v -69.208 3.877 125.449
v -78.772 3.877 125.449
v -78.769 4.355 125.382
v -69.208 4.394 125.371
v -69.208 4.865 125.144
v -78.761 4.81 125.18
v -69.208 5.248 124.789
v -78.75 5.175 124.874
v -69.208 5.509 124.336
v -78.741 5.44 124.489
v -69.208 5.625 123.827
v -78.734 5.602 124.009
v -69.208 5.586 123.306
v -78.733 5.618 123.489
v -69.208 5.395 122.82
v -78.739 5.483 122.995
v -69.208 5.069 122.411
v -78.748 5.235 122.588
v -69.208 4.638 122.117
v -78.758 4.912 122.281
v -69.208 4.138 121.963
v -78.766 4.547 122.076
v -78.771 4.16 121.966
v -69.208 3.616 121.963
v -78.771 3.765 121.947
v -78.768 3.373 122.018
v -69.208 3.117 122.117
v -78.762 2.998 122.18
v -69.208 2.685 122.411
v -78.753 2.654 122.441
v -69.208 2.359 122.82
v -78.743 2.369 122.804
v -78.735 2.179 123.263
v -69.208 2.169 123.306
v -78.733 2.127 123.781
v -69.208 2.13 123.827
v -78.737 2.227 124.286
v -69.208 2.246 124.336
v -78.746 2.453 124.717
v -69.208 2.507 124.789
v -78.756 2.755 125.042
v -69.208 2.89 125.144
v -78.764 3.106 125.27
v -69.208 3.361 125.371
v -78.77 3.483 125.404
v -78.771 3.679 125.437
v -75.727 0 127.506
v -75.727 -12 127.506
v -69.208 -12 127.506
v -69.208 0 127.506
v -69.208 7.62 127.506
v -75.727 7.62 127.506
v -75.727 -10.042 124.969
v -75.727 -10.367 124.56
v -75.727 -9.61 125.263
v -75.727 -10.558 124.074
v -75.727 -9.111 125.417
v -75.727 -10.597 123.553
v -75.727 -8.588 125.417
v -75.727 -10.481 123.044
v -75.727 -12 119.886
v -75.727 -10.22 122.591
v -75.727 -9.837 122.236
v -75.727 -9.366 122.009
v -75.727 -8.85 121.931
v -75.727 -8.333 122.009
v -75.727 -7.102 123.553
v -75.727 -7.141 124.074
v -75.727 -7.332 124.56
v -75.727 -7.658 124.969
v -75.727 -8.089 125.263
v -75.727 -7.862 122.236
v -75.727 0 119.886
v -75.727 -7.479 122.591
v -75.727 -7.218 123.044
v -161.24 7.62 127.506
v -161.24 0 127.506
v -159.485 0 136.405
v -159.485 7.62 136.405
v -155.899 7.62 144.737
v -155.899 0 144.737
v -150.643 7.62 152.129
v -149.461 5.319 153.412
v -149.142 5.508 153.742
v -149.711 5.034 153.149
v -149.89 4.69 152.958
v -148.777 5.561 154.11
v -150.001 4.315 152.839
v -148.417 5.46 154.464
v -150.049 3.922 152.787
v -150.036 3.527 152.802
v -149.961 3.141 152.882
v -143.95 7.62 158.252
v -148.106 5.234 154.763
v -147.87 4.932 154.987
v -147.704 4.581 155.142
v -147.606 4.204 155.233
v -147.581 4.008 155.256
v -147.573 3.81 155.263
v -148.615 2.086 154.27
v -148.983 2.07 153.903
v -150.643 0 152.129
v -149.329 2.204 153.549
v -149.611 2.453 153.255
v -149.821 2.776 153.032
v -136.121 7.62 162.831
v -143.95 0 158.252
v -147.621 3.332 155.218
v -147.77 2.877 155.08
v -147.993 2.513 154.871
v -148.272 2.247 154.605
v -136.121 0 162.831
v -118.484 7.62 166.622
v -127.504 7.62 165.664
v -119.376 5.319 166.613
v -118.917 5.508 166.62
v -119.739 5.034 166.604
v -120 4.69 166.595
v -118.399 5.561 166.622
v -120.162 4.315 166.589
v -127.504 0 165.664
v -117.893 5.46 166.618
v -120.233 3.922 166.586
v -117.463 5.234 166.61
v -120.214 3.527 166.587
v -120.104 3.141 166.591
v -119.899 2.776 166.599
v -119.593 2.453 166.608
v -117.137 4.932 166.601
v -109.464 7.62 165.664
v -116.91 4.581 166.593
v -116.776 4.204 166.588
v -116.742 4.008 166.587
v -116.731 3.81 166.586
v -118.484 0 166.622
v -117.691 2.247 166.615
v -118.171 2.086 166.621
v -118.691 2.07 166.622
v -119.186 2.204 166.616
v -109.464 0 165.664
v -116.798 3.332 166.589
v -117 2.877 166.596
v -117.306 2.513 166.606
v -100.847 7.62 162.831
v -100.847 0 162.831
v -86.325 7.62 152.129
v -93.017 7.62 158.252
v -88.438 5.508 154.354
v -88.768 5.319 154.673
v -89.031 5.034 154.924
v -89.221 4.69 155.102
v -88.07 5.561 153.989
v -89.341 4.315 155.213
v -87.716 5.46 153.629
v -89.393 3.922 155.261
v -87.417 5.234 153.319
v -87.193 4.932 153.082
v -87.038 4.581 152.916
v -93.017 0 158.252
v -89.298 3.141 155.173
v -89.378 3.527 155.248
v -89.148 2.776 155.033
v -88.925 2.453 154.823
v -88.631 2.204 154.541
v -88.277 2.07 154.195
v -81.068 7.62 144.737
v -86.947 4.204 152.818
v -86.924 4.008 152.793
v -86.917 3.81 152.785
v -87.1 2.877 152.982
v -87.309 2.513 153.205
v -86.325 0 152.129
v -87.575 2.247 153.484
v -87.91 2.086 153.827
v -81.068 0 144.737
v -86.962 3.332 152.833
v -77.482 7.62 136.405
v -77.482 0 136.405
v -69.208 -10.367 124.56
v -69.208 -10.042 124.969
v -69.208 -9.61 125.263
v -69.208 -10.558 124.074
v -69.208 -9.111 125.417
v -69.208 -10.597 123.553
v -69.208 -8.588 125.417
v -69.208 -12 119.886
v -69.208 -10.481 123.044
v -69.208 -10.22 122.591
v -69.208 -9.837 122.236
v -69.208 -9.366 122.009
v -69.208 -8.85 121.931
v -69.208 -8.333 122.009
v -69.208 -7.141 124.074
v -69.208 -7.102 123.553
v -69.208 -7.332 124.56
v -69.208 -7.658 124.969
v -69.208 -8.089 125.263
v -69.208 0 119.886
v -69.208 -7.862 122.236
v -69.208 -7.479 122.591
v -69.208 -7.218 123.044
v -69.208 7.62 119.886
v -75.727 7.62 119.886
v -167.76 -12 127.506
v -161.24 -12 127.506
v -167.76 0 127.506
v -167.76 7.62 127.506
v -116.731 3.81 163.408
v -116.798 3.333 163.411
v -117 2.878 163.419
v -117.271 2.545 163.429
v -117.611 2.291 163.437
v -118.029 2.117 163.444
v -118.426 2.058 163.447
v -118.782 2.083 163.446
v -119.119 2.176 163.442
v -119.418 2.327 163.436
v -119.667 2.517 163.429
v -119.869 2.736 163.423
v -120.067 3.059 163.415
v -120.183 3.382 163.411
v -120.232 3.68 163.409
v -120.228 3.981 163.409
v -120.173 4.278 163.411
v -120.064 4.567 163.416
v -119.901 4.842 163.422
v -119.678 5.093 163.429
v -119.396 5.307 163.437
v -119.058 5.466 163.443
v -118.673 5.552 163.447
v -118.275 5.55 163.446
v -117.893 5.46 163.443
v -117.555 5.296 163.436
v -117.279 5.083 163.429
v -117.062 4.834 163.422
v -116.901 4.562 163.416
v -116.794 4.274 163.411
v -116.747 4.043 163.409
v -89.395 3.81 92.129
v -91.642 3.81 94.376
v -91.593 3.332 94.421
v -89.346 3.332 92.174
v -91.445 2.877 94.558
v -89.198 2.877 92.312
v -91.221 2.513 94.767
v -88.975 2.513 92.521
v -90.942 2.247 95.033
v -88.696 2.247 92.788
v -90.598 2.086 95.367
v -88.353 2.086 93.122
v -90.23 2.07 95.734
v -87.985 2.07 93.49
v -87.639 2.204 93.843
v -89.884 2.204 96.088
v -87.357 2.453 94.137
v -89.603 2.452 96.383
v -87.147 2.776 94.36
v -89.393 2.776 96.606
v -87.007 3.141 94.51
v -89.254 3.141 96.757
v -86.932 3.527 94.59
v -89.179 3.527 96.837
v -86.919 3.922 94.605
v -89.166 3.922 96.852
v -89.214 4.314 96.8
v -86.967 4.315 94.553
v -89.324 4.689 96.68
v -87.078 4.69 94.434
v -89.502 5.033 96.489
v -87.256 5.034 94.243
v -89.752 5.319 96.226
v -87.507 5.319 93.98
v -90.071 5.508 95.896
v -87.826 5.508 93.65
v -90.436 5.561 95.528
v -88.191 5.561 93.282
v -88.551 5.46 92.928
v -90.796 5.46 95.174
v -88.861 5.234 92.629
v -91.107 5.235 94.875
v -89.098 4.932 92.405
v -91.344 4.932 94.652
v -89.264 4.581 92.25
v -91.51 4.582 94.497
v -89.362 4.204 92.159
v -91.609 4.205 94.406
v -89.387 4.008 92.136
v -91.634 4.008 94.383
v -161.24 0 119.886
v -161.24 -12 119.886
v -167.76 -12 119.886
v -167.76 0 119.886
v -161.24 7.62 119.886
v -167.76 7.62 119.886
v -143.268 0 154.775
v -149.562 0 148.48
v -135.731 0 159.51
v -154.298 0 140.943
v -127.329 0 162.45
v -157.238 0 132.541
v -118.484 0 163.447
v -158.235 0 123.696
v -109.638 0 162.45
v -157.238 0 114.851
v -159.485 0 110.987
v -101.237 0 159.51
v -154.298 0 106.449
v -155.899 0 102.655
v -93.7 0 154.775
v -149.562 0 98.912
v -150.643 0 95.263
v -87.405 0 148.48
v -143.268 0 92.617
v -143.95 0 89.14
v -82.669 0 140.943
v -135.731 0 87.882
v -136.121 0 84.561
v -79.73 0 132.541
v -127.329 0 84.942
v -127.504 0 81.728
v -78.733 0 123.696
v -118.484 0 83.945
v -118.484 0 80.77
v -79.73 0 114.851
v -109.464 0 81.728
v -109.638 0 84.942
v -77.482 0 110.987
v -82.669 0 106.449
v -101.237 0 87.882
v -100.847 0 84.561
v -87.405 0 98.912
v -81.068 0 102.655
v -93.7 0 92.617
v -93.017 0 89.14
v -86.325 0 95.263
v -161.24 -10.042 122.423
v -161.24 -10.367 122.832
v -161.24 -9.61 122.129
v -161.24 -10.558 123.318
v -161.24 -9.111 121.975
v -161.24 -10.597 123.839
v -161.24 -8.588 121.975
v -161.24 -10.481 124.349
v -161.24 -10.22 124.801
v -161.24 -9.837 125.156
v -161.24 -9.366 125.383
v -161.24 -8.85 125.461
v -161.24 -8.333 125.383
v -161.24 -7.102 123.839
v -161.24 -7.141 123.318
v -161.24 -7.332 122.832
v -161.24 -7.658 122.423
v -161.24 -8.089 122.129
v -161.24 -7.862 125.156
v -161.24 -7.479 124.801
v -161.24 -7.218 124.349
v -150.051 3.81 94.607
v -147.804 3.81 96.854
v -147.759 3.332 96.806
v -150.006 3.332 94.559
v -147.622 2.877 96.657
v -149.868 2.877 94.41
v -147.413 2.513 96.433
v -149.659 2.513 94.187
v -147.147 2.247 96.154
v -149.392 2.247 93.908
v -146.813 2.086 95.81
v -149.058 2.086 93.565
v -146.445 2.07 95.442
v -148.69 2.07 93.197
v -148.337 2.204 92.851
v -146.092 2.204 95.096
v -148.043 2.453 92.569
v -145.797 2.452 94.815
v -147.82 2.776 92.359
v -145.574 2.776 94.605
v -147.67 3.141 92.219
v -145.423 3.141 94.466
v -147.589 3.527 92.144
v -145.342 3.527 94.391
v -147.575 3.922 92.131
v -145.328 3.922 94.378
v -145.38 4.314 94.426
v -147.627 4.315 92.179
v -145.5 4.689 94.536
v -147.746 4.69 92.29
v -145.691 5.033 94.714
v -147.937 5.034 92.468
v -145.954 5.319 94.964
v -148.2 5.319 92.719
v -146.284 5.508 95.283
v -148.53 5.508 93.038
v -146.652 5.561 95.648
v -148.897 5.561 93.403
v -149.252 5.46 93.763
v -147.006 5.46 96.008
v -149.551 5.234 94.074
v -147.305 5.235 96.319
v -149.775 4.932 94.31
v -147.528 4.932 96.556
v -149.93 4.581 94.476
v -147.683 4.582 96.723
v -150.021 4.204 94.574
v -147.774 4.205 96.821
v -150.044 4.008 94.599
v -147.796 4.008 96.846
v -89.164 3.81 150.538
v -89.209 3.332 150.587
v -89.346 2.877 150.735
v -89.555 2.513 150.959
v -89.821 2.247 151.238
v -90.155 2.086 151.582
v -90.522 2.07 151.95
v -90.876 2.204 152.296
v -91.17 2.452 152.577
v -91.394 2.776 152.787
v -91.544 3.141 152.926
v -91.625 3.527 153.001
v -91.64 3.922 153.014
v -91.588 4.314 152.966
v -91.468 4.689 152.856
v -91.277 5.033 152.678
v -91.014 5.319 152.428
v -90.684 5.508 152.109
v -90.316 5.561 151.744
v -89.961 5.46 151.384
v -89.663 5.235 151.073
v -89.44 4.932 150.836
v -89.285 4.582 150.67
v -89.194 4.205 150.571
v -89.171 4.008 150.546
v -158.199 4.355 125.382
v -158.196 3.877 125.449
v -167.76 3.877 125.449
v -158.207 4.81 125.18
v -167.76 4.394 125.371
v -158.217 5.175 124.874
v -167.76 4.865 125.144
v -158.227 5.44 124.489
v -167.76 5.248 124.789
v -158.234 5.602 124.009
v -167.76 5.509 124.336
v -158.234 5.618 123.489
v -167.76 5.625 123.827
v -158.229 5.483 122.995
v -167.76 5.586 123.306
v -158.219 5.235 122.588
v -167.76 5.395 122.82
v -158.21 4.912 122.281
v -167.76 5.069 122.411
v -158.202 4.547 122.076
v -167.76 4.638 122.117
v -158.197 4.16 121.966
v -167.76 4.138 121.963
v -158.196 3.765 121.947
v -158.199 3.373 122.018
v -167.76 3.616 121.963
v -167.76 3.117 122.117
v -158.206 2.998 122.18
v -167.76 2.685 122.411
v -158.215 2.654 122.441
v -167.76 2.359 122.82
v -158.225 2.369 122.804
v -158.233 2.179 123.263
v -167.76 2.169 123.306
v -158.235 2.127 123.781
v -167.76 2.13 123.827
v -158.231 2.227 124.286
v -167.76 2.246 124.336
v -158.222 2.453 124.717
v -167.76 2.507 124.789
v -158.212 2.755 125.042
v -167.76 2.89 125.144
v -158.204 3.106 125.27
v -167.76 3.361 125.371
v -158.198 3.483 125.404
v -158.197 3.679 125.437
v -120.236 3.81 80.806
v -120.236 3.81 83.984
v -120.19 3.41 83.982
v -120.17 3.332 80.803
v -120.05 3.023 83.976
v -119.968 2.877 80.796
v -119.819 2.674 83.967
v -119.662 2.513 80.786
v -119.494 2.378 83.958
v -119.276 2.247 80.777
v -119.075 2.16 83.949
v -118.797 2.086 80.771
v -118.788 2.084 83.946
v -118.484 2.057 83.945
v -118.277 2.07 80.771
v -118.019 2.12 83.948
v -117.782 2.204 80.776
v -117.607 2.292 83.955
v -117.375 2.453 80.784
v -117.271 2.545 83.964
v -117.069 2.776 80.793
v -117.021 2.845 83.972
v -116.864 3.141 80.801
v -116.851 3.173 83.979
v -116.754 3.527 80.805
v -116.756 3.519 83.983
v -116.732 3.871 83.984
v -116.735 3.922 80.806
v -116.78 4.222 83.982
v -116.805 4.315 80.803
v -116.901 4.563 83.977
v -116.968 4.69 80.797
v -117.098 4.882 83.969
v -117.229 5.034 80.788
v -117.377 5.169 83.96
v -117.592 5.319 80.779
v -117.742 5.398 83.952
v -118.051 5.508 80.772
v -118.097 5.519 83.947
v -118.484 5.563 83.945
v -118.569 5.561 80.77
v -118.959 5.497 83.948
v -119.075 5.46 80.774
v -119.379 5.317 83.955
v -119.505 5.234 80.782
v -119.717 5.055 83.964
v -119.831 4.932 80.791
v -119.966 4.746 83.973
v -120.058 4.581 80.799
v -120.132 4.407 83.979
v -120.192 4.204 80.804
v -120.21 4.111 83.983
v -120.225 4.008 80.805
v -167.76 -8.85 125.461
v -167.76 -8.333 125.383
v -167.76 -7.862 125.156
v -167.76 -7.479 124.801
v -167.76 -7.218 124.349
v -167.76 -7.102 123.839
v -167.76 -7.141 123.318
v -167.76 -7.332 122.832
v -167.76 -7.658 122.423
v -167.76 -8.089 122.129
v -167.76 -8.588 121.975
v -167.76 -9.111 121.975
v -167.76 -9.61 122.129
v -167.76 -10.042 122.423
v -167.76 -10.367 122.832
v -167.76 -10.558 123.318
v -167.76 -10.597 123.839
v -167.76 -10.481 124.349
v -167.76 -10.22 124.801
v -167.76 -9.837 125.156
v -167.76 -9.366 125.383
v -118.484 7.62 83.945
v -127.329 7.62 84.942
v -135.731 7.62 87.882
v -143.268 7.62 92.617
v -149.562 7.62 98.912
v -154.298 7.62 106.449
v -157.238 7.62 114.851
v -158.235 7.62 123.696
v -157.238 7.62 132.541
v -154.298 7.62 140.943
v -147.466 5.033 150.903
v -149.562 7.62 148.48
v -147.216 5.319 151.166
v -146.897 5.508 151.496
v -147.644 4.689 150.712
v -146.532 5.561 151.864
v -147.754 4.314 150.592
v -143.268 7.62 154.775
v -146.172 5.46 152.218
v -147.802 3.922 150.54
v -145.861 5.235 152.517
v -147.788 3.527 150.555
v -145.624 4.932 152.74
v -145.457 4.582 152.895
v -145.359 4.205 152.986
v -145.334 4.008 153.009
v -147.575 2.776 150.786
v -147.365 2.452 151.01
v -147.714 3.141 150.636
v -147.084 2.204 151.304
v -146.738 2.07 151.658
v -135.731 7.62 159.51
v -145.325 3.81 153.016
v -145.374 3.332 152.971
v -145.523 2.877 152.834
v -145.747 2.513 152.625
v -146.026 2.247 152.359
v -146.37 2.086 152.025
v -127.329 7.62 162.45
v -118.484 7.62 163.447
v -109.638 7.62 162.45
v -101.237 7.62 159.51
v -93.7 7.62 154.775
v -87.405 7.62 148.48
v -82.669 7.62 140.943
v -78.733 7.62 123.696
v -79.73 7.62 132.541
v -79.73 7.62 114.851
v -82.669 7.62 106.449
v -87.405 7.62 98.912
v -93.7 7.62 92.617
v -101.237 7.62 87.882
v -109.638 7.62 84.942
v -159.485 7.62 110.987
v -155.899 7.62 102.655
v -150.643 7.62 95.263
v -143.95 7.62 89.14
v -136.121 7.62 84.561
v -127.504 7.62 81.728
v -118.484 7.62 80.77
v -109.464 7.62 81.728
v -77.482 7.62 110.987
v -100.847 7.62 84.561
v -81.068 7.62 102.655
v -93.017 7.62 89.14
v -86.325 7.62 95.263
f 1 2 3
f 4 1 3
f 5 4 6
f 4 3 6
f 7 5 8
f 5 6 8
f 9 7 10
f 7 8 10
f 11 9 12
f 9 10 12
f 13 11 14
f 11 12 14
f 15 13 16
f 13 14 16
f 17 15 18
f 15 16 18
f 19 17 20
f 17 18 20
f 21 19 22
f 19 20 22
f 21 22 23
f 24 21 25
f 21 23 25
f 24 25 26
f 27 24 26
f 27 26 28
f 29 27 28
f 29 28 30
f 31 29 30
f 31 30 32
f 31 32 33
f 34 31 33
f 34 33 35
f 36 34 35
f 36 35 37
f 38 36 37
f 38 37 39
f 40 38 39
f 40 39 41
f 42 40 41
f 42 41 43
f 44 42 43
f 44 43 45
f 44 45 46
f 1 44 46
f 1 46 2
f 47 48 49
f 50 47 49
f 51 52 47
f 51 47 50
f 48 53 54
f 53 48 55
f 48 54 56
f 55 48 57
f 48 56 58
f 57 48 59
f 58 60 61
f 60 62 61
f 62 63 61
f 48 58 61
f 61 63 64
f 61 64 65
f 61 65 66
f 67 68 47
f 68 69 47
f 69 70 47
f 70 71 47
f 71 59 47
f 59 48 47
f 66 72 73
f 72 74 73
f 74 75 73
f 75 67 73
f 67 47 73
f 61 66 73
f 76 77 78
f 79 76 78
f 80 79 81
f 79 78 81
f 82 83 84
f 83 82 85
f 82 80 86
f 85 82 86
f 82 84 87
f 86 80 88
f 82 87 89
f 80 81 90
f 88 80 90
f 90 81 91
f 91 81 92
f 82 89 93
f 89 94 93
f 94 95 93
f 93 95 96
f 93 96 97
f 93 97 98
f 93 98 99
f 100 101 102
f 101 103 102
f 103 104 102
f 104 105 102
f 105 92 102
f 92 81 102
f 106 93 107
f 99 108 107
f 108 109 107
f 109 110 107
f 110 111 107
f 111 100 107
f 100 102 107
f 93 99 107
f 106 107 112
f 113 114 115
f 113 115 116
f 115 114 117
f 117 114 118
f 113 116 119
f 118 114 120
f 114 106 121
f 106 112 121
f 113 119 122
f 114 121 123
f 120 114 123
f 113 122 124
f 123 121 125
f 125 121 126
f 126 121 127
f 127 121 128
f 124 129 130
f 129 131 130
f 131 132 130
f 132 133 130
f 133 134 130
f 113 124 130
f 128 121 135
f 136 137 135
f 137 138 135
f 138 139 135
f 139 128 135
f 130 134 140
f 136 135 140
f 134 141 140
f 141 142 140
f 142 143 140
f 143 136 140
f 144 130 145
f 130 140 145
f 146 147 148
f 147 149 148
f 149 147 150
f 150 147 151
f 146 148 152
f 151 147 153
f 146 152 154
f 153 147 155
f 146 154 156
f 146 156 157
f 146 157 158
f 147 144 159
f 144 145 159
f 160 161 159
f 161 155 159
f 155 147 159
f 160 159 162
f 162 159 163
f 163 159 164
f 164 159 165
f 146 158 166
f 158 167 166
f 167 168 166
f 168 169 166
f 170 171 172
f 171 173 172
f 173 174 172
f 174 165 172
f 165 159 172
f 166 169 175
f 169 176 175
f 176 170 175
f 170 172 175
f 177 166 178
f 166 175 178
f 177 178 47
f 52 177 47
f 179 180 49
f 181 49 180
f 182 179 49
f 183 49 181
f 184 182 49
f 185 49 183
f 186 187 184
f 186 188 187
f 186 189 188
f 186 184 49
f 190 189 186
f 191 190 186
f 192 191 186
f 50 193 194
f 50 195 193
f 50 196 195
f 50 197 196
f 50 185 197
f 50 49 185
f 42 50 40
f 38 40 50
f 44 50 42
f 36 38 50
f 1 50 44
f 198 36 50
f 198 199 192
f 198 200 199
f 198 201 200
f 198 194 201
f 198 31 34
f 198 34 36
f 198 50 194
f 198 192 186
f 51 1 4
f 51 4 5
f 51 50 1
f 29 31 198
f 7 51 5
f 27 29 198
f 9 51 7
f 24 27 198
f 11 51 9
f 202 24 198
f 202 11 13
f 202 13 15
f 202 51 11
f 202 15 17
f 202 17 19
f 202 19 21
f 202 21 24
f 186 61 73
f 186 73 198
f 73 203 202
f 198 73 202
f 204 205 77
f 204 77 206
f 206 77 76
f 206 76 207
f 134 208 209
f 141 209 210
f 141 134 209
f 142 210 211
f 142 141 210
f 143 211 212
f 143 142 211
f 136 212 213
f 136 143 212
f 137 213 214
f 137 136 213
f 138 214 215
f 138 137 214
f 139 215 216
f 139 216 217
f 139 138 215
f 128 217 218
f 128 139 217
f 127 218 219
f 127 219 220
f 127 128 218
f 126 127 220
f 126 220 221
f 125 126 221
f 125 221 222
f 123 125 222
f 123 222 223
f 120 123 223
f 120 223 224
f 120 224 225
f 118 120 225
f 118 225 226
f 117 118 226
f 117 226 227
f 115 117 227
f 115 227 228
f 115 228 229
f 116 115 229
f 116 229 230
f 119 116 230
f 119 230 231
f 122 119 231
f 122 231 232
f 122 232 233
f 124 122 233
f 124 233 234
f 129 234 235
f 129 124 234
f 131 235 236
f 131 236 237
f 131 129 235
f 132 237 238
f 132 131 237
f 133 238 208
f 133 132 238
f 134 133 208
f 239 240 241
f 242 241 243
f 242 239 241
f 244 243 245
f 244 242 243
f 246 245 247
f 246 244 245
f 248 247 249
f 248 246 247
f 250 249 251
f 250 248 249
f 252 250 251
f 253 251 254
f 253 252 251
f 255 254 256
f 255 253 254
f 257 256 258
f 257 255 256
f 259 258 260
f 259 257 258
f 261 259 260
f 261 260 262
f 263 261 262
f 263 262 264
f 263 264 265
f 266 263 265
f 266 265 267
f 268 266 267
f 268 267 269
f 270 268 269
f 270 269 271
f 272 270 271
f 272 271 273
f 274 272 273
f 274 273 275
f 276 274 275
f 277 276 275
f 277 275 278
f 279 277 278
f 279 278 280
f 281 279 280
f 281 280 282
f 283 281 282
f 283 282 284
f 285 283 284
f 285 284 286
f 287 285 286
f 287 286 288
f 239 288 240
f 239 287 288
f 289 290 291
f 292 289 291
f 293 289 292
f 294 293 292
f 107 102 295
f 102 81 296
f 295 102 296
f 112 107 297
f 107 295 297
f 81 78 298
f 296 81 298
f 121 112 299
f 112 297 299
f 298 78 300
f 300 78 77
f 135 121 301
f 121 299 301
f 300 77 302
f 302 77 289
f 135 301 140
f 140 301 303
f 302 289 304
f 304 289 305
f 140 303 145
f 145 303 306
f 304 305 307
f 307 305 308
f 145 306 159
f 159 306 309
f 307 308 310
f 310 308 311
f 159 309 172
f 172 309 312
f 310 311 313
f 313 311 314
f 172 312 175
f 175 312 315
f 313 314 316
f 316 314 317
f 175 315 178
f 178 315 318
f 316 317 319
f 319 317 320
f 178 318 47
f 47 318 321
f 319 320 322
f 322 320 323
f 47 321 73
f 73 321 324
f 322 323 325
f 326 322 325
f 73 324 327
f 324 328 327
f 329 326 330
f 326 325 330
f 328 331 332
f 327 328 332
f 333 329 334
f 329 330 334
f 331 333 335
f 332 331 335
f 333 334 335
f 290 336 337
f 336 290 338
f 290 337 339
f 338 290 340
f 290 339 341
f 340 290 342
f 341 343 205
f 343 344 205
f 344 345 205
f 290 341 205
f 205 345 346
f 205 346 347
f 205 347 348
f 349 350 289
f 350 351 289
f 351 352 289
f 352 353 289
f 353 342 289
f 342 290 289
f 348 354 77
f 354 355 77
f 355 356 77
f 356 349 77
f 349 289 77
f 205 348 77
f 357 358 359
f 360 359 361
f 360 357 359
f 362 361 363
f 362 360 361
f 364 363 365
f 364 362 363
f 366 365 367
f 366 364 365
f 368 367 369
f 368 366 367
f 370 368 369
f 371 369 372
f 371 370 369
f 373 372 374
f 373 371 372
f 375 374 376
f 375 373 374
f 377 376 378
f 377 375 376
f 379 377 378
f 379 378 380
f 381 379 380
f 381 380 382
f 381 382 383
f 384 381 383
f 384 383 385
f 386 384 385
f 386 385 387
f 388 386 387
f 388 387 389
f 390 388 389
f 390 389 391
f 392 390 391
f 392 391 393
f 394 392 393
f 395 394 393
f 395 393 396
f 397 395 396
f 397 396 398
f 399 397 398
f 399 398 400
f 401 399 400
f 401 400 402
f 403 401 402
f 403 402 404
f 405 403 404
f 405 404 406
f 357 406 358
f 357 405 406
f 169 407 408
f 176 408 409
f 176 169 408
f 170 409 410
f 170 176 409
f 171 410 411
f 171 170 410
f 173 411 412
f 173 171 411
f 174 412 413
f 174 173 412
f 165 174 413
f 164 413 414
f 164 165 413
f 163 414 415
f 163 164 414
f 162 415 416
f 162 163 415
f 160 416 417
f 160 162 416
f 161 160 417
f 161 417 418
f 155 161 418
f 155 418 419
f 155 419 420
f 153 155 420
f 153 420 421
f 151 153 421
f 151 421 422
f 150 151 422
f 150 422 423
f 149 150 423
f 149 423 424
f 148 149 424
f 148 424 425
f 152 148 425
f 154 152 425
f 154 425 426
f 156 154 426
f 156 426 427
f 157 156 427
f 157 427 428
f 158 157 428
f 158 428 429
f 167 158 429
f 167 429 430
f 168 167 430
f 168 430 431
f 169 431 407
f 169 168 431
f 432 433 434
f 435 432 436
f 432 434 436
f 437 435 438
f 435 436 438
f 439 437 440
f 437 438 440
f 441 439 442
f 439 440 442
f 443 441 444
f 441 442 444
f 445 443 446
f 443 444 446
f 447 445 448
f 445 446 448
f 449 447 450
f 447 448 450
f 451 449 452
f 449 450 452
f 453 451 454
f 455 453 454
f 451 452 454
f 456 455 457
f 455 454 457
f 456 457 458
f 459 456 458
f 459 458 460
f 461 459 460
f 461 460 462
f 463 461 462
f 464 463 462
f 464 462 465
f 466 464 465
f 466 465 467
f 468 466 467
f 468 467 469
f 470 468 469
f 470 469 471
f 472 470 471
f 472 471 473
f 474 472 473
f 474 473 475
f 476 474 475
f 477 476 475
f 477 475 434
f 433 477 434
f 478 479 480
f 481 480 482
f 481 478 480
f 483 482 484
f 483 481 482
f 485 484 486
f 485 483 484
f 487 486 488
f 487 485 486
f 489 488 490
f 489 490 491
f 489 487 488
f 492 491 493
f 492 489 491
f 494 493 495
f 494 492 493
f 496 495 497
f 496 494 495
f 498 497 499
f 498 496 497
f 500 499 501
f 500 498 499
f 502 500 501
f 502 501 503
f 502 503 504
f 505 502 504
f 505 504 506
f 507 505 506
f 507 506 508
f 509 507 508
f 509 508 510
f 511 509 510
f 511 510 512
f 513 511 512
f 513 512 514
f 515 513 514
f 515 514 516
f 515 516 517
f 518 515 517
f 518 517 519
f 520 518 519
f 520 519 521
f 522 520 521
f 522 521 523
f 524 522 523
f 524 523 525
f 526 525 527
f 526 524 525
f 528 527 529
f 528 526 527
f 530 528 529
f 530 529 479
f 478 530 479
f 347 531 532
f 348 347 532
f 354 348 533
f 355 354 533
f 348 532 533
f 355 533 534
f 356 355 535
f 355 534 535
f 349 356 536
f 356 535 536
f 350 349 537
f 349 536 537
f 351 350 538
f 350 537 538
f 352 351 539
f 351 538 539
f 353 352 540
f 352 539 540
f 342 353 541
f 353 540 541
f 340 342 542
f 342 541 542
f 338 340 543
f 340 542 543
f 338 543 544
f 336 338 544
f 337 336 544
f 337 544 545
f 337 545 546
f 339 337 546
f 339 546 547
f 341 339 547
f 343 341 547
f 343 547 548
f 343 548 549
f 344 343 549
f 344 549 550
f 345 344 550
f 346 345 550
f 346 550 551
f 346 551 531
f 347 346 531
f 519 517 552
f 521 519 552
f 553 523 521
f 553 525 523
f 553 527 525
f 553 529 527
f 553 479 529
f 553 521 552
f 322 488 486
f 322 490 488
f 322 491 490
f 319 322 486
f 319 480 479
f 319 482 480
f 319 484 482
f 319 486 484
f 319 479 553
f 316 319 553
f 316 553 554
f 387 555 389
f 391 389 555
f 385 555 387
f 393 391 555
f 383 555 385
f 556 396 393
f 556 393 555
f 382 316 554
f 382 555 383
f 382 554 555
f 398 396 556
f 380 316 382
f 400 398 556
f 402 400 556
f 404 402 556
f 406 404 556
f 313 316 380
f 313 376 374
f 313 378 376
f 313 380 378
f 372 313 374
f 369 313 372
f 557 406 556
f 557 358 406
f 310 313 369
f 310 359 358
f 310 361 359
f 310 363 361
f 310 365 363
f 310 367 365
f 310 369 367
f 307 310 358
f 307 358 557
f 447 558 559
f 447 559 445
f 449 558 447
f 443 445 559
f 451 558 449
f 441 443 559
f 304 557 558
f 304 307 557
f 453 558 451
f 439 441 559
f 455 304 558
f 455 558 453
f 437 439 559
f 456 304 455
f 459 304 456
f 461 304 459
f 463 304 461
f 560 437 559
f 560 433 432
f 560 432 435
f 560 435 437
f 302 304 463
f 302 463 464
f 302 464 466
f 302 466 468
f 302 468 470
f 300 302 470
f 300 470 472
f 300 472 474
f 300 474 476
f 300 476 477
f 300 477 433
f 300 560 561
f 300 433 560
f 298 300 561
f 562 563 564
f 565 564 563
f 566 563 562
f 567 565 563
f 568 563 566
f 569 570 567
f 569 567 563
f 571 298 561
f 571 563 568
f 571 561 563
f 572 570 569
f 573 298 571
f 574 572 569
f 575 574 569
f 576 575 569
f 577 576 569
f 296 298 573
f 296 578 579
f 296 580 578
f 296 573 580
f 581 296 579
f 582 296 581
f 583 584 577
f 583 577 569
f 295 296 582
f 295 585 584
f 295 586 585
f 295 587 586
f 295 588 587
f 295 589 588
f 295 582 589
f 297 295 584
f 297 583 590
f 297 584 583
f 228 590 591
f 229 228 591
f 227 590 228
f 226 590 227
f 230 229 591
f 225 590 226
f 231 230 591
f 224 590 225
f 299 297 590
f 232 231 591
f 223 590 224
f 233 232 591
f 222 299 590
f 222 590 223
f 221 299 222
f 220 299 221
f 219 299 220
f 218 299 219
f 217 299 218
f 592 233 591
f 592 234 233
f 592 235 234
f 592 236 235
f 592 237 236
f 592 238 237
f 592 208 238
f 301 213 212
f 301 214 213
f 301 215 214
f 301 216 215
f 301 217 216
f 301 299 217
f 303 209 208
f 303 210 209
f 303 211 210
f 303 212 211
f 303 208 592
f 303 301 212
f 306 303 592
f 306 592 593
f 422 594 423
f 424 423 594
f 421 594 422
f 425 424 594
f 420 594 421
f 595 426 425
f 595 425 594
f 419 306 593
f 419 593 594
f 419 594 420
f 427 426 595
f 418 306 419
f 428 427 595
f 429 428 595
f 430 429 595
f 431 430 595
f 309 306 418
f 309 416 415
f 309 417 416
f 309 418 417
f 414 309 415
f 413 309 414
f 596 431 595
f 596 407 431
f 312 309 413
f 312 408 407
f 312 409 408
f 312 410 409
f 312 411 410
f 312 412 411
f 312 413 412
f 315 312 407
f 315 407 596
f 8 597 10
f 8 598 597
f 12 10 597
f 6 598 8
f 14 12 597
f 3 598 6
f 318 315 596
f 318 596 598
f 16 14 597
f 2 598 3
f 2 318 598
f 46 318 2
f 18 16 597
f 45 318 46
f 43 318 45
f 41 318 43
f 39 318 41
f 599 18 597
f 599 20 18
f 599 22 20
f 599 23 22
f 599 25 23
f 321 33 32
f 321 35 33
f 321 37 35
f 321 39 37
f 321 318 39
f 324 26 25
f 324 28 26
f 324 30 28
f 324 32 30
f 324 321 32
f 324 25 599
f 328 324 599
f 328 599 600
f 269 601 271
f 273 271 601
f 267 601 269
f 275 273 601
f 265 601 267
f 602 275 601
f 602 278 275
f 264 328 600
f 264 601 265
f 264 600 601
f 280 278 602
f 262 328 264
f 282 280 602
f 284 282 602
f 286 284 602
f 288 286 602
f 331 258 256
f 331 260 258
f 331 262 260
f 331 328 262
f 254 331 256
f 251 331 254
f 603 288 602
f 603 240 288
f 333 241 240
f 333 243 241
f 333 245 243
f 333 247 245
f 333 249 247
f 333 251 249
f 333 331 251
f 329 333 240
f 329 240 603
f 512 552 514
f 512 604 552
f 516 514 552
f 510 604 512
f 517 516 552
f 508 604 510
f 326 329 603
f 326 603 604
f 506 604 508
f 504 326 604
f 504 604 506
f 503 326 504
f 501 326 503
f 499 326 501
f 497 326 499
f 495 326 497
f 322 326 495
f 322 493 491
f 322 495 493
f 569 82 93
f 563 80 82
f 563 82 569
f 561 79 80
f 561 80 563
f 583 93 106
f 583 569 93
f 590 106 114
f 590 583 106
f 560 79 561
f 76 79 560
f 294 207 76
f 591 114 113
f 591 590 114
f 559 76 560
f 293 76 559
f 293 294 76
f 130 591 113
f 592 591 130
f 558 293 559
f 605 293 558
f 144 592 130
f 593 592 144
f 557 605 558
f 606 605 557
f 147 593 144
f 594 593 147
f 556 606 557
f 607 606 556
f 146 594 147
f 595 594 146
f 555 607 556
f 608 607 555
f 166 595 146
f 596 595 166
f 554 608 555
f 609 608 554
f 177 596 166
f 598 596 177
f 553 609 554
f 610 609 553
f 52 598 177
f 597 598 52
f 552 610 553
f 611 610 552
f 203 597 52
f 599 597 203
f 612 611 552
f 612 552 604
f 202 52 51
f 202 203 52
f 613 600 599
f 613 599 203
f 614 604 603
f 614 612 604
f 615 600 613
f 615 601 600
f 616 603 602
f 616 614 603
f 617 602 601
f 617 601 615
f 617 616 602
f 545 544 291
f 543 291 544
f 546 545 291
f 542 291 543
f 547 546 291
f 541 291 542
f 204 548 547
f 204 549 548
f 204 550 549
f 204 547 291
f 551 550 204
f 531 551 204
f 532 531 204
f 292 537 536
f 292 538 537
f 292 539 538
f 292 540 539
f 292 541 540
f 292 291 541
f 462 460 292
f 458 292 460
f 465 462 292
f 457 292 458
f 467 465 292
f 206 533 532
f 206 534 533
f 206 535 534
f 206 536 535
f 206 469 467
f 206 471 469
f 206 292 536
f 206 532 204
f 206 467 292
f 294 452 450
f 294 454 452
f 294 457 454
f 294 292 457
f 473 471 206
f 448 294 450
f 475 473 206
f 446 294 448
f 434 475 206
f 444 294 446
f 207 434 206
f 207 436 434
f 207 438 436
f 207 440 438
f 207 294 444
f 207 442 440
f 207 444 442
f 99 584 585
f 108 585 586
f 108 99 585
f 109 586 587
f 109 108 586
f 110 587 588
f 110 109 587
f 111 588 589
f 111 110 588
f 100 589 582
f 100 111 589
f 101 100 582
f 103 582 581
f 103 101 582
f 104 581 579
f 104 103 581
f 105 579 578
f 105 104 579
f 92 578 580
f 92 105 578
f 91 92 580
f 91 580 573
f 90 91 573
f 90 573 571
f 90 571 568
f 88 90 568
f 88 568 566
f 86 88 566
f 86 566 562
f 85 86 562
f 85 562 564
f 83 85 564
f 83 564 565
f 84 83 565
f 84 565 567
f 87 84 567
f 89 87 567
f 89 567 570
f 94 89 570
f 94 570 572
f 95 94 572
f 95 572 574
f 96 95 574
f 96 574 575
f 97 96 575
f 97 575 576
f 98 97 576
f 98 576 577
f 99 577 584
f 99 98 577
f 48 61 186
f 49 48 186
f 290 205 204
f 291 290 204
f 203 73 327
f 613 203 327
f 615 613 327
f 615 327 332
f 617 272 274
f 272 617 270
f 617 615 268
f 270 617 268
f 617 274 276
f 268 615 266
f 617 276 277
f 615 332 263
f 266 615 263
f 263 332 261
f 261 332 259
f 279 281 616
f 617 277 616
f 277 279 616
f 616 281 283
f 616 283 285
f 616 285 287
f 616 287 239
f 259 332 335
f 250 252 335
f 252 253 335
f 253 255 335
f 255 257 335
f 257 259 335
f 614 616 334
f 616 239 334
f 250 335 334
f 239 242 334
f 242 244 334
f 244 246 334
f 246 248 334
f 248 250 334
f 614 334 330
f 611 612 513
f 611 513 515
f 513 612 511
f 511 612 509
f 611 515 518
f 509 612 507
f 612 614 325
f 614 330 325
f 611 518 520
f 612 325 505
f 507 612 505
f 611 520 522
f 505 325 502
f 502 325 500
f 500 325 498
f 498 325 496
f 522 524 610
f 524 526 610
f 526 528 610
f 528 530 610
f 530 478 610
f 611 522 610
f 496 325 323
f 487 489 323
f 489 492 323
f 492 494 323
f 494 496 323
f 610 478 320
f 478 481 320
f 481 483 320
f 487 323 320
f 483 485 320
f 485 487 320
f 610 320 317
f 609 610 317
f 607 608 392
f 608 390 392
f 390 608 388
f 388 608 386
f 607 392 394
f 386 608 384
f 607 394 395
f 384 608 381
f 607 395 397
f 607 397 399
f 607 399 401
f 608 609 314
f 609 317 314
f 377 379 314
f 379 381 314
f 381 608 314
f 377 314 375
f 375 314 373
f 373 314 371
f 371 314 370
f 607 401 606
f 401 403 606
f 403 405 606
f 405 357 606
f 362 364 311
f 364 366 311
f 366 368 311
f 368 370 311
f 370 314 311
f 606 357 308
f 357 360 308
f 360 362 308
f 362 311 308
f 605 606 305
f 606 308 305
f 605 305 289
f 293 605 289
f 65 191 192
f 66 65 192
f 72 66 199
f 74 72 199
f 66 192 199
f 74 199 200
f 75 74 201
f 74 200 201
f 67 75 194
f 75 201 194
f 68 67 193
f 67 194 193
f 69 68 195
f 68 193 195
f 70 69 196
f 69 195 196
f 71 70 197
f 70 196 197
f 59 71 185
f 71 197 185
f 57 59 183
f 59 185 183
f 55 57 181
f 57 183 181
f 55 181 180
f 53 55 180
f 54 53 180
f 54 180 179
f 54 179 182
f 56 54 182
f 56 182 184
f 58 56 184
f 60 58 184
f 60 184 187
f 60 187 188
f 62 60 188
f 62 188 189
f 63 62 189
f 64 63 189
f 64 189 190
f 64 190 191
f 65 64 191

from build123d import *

# Parameters (mm, degrees)
SKETCH1_R           = 42.926
SKETCH1_R_2         = 39.751
BOSS_EXTRUDE1_DEPTH = 7.62
SKETCH2_R           = 1.7526
CUT_EXTRUDE1_DEPTH  = 95.7
CIRPATTERN1_COUNT   = 8
SKETCH6_R           = 1.7526
CUT_EXTRUDE2_DEPTH  = 119.35
BOSS_EXTRUDE2_START = -7.62
SKETCH8_W           = 6.519417161
SKETCH8_H           = 7.62
BOSS_EXTRUDE2_DEPTH = 12
SKETCH10_R          = 1.7526
CUT_EXTRUDE3_DEPTH  = 9
CIRPATTERN2_COUNT   = 2


with BuildPart() as part:
    # Sketch1 → Boss-Extrude1 (new body)
    # profile 1 of 3: a face of its own
    with BuildSketch(Plane(origin=(0, 0, 0), x_dir=(1, 0, 0), z_dir=(0, 1, 0))):
        with BuildLine():
            Line((-167.759899912, -119.886046801), (-167.759899912, -127.506046801))
            Line((-167.759899912, -127.506046801), (-161.24048275, -127.506046801))
            ThreePointArc((-161.24048275, -127.506046801), (-161.409899912, -123.696046801), (-161.24048275, -119.886046801))
            Line((-161.24048275, -119.886046801), (-167.759899912, -119.886046801))
        make_face()
    # profile 2 of 3: a face of its own
    with BuildSketch(Plane(origin=(0, 0, 0), x_dir=(1, 0, 0), z_dir=(0, 1, 0))):
        with Locations((-118.483899912, -123.696046801)):
            Circle(SKETCH1_R)
        with Locations(Location((-118.483899912, -123.696046801, 0), (0, 0, 90))):
            Circle(SKETCH1_R_2, mode=Mode.SUBTRACT)
    # profile 3 of 3: a face of its own
    with BuildSketch(Plane(origin=(0, 0, 0), x_dir=(1, 0, 0), z_dir=(0, 1, 0))):
        with BuildLine():
            ThreePointArc((-75.557899912, -123.696046801), (-75.600275118, -125.602929216), (-75.727317073, -127.506046801))
            Line((-75.727317073, -127.506046801), (-69.207899912, -127.506046801))
            Line((-69.207899912, -127.506046801), (-69.207899912, -119.886046801))
            Line((-69.207899912, -119.886046801), (-75.727317073, -119.886046801))
            ThreePointArc((-75.727317073, -119.886046801), (-75.600275118, -121.789164387), (-75.557899912, -123.696046801))
        make_face()
    extrude(amount=BOSS_EXTRUDE1_DEPTH)

    # Sketch2 → Cut-Extrude1 (cut)
    with BuildSketch(Plane.XY):
        with Locations(Location((-118.483899912, 3.81, 0), (0, 0, 180))):
            Circle(SKETCH2_R)
    cut_extrude1 = extrude(amount=CUT_EXTRUDE1_DEPTH, mode=Mode.SUBTRACT)

    # CirPattern1: Cut-Extrude1 ×8 about axis, 2 skipped
    cirpattern1_axis = Axis((-118.483899912, 7.62, 123.696046801), (0, 1, 0))
    add([cut_extrude1.rotate(cirpattern1_axis, i * 360 / CIRPATTERN1_COUNT) for i in range(1, CIRPATTERN1_COUNT) if i not in (2, 6)], mode=Mode.SUBTRACT)

    # Sketch6 → Cut-Extrude2 (cut)
    with BuildSketch(Plane.ZY.offset(167.759899912)):
        with Locations((123.696046801, 3.877276016)):
            Circle(SKETCH6_R)
    extrude(amount=-CUT_EXTRUDE2_DEPTH, mode=Mode.SUBTRACT)

    # Sketch8 → Boss-Extrude2 (add)
    with BuildSketch(Plane(origin=(0, 7.62, 0), x_dir=(1, 0, 0), z_dir=(0, 1, 0)).offset(BOSS_EXTRUDE2_START)):
        with Locations((-72.467608493, -123.696046801)):
            Rectangle(SKETCH8_W, SKETCH8_H)
    boss_extrude2 = extrude(amount=-BOSS_EXTRUDE2_DEPTH)

    # Sketch10 → Cut-Extrude3 (cut)
    with BuildSketch(Plane(origin=(-69.207899912, 0, 0), x_dir=(0, 0, -1), z_dir=(1, 0, 0))):
        with Locations((-123.683858545, -8.849612584)):
            Circle(SKETCH10_R)
    cut_extrude3 = extrude(amount=-CUT_EXTRUDE3_DEPTH, mode=Mode.SUBTRACT)

    # CirPattern2: Boss-Extrude2, Cut-Extrude3 ×2 about axis
    cirpattern2_axis = Axis((-118.483899912, 7.62, 123.696046801), (0, 1, 0))
    add([boss_extrude2.rotate(cirpattern2_axis, i * 360 / CIRPATTERN2_COUNT) for i in range(1, CIRPATTERN2_COUNT)])
    add([cut_extrude3.rotate(cirpattern2_axis, i * 360 / CIRPATTERN2_COUNT) for i in range(1, CIRPATTERN2_COUNT)], mode=Mode.SUBTRACT)


solid = part.part
